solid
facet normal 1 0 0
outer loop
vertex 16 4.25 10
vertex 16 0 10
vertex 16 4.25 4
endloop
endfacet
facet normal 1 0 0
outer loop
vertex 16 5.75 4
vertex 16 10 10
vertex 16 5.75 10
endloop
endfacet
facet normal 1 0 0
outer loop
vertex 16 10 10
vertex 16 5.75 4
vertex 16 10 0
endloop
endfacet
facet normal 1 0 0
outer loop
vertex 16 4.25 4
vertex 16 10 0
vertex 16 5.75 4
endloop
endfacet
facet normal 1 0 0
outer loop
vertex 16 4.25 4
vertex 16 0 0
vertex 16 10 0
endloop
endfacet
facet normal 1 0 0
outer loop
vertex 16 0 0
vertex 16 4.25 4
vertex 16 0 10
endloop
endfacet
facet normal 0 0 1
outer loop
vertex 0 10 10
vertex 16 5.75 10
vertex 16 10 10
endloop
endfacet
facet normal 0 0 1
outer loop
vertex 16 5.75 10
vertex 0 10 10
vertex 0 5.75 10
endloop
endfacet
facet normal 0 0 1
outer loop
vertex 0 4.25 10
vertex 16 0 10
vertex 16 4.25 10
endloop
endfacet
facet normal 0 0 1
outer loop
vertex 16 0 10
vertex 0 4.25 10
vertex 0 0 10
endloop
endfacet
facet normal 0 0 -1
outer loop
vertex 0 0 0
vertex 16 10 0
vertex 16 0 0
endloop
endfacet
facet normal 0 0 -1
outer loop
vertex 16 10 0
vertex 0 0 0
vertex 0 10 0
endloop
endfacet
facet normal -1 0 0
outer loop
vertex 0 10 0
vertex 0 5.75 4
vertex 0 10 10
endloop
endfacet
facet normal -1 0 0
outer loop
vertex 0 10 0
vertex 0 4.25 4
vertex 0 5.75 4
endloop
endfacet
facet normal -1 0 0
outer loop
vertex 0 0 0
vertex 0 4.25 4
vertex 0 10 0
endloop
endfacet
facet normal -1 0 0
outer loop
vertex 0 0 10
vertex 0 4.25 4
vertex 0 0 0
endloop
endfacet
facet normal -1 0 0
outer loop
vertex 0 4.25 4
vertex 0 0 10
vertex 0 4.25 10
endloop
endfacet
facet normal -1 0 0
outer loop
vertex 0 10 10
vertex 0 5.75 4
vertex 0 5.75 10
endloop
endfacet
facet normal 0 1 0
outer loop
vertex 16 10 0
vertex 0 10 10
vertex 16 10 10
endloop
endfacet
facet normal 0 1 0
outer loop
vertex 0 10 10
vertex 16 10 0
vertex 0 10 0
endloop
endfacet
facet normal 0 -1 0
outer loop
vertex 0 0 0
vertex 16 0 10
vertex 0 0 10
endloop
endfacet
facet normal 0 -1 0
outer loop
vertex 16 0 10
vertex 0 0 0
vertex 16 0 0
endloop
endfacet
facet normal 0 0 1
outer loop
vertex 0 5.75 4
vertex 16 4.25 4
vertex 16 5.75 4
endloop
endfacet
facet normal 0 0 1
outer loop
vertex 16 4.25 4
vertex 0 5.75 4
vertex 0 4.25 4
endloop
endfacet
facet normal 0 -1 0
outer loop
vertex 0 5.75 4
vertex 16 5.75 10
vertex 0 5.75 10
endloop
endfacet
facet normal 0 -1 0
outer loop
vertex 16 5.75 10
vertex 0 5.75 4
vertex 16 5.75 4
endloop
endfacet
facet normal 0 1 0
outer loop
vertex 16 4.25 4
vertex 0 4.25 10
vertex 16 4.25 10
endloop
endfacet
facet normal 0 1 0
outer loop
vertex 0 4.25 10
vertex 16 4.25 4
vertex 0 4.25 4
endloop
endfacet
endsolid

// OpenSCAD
$fn = 32;

// ----------------------------------------------------------------------
// Micro clip: slotted block, 5-20 mm class
// ----------------------------------------------------------------------

// --- parameters (mm) ---
block_l = 16;             // block length, X
block_w = 10;             // block width, Y
block_h = 10;             // block height, Z
slot_w = 1.5;             // slot width
slot_d = 6;               // slot depth from the top

difference() {
  cube([block_l, block_w, block_h]);
  translate([-1, block_w / 2 - slot_w / 2, block_h - slot_d])
    cube([block_l + 2, slot_w, slot_d + 1]);
}
